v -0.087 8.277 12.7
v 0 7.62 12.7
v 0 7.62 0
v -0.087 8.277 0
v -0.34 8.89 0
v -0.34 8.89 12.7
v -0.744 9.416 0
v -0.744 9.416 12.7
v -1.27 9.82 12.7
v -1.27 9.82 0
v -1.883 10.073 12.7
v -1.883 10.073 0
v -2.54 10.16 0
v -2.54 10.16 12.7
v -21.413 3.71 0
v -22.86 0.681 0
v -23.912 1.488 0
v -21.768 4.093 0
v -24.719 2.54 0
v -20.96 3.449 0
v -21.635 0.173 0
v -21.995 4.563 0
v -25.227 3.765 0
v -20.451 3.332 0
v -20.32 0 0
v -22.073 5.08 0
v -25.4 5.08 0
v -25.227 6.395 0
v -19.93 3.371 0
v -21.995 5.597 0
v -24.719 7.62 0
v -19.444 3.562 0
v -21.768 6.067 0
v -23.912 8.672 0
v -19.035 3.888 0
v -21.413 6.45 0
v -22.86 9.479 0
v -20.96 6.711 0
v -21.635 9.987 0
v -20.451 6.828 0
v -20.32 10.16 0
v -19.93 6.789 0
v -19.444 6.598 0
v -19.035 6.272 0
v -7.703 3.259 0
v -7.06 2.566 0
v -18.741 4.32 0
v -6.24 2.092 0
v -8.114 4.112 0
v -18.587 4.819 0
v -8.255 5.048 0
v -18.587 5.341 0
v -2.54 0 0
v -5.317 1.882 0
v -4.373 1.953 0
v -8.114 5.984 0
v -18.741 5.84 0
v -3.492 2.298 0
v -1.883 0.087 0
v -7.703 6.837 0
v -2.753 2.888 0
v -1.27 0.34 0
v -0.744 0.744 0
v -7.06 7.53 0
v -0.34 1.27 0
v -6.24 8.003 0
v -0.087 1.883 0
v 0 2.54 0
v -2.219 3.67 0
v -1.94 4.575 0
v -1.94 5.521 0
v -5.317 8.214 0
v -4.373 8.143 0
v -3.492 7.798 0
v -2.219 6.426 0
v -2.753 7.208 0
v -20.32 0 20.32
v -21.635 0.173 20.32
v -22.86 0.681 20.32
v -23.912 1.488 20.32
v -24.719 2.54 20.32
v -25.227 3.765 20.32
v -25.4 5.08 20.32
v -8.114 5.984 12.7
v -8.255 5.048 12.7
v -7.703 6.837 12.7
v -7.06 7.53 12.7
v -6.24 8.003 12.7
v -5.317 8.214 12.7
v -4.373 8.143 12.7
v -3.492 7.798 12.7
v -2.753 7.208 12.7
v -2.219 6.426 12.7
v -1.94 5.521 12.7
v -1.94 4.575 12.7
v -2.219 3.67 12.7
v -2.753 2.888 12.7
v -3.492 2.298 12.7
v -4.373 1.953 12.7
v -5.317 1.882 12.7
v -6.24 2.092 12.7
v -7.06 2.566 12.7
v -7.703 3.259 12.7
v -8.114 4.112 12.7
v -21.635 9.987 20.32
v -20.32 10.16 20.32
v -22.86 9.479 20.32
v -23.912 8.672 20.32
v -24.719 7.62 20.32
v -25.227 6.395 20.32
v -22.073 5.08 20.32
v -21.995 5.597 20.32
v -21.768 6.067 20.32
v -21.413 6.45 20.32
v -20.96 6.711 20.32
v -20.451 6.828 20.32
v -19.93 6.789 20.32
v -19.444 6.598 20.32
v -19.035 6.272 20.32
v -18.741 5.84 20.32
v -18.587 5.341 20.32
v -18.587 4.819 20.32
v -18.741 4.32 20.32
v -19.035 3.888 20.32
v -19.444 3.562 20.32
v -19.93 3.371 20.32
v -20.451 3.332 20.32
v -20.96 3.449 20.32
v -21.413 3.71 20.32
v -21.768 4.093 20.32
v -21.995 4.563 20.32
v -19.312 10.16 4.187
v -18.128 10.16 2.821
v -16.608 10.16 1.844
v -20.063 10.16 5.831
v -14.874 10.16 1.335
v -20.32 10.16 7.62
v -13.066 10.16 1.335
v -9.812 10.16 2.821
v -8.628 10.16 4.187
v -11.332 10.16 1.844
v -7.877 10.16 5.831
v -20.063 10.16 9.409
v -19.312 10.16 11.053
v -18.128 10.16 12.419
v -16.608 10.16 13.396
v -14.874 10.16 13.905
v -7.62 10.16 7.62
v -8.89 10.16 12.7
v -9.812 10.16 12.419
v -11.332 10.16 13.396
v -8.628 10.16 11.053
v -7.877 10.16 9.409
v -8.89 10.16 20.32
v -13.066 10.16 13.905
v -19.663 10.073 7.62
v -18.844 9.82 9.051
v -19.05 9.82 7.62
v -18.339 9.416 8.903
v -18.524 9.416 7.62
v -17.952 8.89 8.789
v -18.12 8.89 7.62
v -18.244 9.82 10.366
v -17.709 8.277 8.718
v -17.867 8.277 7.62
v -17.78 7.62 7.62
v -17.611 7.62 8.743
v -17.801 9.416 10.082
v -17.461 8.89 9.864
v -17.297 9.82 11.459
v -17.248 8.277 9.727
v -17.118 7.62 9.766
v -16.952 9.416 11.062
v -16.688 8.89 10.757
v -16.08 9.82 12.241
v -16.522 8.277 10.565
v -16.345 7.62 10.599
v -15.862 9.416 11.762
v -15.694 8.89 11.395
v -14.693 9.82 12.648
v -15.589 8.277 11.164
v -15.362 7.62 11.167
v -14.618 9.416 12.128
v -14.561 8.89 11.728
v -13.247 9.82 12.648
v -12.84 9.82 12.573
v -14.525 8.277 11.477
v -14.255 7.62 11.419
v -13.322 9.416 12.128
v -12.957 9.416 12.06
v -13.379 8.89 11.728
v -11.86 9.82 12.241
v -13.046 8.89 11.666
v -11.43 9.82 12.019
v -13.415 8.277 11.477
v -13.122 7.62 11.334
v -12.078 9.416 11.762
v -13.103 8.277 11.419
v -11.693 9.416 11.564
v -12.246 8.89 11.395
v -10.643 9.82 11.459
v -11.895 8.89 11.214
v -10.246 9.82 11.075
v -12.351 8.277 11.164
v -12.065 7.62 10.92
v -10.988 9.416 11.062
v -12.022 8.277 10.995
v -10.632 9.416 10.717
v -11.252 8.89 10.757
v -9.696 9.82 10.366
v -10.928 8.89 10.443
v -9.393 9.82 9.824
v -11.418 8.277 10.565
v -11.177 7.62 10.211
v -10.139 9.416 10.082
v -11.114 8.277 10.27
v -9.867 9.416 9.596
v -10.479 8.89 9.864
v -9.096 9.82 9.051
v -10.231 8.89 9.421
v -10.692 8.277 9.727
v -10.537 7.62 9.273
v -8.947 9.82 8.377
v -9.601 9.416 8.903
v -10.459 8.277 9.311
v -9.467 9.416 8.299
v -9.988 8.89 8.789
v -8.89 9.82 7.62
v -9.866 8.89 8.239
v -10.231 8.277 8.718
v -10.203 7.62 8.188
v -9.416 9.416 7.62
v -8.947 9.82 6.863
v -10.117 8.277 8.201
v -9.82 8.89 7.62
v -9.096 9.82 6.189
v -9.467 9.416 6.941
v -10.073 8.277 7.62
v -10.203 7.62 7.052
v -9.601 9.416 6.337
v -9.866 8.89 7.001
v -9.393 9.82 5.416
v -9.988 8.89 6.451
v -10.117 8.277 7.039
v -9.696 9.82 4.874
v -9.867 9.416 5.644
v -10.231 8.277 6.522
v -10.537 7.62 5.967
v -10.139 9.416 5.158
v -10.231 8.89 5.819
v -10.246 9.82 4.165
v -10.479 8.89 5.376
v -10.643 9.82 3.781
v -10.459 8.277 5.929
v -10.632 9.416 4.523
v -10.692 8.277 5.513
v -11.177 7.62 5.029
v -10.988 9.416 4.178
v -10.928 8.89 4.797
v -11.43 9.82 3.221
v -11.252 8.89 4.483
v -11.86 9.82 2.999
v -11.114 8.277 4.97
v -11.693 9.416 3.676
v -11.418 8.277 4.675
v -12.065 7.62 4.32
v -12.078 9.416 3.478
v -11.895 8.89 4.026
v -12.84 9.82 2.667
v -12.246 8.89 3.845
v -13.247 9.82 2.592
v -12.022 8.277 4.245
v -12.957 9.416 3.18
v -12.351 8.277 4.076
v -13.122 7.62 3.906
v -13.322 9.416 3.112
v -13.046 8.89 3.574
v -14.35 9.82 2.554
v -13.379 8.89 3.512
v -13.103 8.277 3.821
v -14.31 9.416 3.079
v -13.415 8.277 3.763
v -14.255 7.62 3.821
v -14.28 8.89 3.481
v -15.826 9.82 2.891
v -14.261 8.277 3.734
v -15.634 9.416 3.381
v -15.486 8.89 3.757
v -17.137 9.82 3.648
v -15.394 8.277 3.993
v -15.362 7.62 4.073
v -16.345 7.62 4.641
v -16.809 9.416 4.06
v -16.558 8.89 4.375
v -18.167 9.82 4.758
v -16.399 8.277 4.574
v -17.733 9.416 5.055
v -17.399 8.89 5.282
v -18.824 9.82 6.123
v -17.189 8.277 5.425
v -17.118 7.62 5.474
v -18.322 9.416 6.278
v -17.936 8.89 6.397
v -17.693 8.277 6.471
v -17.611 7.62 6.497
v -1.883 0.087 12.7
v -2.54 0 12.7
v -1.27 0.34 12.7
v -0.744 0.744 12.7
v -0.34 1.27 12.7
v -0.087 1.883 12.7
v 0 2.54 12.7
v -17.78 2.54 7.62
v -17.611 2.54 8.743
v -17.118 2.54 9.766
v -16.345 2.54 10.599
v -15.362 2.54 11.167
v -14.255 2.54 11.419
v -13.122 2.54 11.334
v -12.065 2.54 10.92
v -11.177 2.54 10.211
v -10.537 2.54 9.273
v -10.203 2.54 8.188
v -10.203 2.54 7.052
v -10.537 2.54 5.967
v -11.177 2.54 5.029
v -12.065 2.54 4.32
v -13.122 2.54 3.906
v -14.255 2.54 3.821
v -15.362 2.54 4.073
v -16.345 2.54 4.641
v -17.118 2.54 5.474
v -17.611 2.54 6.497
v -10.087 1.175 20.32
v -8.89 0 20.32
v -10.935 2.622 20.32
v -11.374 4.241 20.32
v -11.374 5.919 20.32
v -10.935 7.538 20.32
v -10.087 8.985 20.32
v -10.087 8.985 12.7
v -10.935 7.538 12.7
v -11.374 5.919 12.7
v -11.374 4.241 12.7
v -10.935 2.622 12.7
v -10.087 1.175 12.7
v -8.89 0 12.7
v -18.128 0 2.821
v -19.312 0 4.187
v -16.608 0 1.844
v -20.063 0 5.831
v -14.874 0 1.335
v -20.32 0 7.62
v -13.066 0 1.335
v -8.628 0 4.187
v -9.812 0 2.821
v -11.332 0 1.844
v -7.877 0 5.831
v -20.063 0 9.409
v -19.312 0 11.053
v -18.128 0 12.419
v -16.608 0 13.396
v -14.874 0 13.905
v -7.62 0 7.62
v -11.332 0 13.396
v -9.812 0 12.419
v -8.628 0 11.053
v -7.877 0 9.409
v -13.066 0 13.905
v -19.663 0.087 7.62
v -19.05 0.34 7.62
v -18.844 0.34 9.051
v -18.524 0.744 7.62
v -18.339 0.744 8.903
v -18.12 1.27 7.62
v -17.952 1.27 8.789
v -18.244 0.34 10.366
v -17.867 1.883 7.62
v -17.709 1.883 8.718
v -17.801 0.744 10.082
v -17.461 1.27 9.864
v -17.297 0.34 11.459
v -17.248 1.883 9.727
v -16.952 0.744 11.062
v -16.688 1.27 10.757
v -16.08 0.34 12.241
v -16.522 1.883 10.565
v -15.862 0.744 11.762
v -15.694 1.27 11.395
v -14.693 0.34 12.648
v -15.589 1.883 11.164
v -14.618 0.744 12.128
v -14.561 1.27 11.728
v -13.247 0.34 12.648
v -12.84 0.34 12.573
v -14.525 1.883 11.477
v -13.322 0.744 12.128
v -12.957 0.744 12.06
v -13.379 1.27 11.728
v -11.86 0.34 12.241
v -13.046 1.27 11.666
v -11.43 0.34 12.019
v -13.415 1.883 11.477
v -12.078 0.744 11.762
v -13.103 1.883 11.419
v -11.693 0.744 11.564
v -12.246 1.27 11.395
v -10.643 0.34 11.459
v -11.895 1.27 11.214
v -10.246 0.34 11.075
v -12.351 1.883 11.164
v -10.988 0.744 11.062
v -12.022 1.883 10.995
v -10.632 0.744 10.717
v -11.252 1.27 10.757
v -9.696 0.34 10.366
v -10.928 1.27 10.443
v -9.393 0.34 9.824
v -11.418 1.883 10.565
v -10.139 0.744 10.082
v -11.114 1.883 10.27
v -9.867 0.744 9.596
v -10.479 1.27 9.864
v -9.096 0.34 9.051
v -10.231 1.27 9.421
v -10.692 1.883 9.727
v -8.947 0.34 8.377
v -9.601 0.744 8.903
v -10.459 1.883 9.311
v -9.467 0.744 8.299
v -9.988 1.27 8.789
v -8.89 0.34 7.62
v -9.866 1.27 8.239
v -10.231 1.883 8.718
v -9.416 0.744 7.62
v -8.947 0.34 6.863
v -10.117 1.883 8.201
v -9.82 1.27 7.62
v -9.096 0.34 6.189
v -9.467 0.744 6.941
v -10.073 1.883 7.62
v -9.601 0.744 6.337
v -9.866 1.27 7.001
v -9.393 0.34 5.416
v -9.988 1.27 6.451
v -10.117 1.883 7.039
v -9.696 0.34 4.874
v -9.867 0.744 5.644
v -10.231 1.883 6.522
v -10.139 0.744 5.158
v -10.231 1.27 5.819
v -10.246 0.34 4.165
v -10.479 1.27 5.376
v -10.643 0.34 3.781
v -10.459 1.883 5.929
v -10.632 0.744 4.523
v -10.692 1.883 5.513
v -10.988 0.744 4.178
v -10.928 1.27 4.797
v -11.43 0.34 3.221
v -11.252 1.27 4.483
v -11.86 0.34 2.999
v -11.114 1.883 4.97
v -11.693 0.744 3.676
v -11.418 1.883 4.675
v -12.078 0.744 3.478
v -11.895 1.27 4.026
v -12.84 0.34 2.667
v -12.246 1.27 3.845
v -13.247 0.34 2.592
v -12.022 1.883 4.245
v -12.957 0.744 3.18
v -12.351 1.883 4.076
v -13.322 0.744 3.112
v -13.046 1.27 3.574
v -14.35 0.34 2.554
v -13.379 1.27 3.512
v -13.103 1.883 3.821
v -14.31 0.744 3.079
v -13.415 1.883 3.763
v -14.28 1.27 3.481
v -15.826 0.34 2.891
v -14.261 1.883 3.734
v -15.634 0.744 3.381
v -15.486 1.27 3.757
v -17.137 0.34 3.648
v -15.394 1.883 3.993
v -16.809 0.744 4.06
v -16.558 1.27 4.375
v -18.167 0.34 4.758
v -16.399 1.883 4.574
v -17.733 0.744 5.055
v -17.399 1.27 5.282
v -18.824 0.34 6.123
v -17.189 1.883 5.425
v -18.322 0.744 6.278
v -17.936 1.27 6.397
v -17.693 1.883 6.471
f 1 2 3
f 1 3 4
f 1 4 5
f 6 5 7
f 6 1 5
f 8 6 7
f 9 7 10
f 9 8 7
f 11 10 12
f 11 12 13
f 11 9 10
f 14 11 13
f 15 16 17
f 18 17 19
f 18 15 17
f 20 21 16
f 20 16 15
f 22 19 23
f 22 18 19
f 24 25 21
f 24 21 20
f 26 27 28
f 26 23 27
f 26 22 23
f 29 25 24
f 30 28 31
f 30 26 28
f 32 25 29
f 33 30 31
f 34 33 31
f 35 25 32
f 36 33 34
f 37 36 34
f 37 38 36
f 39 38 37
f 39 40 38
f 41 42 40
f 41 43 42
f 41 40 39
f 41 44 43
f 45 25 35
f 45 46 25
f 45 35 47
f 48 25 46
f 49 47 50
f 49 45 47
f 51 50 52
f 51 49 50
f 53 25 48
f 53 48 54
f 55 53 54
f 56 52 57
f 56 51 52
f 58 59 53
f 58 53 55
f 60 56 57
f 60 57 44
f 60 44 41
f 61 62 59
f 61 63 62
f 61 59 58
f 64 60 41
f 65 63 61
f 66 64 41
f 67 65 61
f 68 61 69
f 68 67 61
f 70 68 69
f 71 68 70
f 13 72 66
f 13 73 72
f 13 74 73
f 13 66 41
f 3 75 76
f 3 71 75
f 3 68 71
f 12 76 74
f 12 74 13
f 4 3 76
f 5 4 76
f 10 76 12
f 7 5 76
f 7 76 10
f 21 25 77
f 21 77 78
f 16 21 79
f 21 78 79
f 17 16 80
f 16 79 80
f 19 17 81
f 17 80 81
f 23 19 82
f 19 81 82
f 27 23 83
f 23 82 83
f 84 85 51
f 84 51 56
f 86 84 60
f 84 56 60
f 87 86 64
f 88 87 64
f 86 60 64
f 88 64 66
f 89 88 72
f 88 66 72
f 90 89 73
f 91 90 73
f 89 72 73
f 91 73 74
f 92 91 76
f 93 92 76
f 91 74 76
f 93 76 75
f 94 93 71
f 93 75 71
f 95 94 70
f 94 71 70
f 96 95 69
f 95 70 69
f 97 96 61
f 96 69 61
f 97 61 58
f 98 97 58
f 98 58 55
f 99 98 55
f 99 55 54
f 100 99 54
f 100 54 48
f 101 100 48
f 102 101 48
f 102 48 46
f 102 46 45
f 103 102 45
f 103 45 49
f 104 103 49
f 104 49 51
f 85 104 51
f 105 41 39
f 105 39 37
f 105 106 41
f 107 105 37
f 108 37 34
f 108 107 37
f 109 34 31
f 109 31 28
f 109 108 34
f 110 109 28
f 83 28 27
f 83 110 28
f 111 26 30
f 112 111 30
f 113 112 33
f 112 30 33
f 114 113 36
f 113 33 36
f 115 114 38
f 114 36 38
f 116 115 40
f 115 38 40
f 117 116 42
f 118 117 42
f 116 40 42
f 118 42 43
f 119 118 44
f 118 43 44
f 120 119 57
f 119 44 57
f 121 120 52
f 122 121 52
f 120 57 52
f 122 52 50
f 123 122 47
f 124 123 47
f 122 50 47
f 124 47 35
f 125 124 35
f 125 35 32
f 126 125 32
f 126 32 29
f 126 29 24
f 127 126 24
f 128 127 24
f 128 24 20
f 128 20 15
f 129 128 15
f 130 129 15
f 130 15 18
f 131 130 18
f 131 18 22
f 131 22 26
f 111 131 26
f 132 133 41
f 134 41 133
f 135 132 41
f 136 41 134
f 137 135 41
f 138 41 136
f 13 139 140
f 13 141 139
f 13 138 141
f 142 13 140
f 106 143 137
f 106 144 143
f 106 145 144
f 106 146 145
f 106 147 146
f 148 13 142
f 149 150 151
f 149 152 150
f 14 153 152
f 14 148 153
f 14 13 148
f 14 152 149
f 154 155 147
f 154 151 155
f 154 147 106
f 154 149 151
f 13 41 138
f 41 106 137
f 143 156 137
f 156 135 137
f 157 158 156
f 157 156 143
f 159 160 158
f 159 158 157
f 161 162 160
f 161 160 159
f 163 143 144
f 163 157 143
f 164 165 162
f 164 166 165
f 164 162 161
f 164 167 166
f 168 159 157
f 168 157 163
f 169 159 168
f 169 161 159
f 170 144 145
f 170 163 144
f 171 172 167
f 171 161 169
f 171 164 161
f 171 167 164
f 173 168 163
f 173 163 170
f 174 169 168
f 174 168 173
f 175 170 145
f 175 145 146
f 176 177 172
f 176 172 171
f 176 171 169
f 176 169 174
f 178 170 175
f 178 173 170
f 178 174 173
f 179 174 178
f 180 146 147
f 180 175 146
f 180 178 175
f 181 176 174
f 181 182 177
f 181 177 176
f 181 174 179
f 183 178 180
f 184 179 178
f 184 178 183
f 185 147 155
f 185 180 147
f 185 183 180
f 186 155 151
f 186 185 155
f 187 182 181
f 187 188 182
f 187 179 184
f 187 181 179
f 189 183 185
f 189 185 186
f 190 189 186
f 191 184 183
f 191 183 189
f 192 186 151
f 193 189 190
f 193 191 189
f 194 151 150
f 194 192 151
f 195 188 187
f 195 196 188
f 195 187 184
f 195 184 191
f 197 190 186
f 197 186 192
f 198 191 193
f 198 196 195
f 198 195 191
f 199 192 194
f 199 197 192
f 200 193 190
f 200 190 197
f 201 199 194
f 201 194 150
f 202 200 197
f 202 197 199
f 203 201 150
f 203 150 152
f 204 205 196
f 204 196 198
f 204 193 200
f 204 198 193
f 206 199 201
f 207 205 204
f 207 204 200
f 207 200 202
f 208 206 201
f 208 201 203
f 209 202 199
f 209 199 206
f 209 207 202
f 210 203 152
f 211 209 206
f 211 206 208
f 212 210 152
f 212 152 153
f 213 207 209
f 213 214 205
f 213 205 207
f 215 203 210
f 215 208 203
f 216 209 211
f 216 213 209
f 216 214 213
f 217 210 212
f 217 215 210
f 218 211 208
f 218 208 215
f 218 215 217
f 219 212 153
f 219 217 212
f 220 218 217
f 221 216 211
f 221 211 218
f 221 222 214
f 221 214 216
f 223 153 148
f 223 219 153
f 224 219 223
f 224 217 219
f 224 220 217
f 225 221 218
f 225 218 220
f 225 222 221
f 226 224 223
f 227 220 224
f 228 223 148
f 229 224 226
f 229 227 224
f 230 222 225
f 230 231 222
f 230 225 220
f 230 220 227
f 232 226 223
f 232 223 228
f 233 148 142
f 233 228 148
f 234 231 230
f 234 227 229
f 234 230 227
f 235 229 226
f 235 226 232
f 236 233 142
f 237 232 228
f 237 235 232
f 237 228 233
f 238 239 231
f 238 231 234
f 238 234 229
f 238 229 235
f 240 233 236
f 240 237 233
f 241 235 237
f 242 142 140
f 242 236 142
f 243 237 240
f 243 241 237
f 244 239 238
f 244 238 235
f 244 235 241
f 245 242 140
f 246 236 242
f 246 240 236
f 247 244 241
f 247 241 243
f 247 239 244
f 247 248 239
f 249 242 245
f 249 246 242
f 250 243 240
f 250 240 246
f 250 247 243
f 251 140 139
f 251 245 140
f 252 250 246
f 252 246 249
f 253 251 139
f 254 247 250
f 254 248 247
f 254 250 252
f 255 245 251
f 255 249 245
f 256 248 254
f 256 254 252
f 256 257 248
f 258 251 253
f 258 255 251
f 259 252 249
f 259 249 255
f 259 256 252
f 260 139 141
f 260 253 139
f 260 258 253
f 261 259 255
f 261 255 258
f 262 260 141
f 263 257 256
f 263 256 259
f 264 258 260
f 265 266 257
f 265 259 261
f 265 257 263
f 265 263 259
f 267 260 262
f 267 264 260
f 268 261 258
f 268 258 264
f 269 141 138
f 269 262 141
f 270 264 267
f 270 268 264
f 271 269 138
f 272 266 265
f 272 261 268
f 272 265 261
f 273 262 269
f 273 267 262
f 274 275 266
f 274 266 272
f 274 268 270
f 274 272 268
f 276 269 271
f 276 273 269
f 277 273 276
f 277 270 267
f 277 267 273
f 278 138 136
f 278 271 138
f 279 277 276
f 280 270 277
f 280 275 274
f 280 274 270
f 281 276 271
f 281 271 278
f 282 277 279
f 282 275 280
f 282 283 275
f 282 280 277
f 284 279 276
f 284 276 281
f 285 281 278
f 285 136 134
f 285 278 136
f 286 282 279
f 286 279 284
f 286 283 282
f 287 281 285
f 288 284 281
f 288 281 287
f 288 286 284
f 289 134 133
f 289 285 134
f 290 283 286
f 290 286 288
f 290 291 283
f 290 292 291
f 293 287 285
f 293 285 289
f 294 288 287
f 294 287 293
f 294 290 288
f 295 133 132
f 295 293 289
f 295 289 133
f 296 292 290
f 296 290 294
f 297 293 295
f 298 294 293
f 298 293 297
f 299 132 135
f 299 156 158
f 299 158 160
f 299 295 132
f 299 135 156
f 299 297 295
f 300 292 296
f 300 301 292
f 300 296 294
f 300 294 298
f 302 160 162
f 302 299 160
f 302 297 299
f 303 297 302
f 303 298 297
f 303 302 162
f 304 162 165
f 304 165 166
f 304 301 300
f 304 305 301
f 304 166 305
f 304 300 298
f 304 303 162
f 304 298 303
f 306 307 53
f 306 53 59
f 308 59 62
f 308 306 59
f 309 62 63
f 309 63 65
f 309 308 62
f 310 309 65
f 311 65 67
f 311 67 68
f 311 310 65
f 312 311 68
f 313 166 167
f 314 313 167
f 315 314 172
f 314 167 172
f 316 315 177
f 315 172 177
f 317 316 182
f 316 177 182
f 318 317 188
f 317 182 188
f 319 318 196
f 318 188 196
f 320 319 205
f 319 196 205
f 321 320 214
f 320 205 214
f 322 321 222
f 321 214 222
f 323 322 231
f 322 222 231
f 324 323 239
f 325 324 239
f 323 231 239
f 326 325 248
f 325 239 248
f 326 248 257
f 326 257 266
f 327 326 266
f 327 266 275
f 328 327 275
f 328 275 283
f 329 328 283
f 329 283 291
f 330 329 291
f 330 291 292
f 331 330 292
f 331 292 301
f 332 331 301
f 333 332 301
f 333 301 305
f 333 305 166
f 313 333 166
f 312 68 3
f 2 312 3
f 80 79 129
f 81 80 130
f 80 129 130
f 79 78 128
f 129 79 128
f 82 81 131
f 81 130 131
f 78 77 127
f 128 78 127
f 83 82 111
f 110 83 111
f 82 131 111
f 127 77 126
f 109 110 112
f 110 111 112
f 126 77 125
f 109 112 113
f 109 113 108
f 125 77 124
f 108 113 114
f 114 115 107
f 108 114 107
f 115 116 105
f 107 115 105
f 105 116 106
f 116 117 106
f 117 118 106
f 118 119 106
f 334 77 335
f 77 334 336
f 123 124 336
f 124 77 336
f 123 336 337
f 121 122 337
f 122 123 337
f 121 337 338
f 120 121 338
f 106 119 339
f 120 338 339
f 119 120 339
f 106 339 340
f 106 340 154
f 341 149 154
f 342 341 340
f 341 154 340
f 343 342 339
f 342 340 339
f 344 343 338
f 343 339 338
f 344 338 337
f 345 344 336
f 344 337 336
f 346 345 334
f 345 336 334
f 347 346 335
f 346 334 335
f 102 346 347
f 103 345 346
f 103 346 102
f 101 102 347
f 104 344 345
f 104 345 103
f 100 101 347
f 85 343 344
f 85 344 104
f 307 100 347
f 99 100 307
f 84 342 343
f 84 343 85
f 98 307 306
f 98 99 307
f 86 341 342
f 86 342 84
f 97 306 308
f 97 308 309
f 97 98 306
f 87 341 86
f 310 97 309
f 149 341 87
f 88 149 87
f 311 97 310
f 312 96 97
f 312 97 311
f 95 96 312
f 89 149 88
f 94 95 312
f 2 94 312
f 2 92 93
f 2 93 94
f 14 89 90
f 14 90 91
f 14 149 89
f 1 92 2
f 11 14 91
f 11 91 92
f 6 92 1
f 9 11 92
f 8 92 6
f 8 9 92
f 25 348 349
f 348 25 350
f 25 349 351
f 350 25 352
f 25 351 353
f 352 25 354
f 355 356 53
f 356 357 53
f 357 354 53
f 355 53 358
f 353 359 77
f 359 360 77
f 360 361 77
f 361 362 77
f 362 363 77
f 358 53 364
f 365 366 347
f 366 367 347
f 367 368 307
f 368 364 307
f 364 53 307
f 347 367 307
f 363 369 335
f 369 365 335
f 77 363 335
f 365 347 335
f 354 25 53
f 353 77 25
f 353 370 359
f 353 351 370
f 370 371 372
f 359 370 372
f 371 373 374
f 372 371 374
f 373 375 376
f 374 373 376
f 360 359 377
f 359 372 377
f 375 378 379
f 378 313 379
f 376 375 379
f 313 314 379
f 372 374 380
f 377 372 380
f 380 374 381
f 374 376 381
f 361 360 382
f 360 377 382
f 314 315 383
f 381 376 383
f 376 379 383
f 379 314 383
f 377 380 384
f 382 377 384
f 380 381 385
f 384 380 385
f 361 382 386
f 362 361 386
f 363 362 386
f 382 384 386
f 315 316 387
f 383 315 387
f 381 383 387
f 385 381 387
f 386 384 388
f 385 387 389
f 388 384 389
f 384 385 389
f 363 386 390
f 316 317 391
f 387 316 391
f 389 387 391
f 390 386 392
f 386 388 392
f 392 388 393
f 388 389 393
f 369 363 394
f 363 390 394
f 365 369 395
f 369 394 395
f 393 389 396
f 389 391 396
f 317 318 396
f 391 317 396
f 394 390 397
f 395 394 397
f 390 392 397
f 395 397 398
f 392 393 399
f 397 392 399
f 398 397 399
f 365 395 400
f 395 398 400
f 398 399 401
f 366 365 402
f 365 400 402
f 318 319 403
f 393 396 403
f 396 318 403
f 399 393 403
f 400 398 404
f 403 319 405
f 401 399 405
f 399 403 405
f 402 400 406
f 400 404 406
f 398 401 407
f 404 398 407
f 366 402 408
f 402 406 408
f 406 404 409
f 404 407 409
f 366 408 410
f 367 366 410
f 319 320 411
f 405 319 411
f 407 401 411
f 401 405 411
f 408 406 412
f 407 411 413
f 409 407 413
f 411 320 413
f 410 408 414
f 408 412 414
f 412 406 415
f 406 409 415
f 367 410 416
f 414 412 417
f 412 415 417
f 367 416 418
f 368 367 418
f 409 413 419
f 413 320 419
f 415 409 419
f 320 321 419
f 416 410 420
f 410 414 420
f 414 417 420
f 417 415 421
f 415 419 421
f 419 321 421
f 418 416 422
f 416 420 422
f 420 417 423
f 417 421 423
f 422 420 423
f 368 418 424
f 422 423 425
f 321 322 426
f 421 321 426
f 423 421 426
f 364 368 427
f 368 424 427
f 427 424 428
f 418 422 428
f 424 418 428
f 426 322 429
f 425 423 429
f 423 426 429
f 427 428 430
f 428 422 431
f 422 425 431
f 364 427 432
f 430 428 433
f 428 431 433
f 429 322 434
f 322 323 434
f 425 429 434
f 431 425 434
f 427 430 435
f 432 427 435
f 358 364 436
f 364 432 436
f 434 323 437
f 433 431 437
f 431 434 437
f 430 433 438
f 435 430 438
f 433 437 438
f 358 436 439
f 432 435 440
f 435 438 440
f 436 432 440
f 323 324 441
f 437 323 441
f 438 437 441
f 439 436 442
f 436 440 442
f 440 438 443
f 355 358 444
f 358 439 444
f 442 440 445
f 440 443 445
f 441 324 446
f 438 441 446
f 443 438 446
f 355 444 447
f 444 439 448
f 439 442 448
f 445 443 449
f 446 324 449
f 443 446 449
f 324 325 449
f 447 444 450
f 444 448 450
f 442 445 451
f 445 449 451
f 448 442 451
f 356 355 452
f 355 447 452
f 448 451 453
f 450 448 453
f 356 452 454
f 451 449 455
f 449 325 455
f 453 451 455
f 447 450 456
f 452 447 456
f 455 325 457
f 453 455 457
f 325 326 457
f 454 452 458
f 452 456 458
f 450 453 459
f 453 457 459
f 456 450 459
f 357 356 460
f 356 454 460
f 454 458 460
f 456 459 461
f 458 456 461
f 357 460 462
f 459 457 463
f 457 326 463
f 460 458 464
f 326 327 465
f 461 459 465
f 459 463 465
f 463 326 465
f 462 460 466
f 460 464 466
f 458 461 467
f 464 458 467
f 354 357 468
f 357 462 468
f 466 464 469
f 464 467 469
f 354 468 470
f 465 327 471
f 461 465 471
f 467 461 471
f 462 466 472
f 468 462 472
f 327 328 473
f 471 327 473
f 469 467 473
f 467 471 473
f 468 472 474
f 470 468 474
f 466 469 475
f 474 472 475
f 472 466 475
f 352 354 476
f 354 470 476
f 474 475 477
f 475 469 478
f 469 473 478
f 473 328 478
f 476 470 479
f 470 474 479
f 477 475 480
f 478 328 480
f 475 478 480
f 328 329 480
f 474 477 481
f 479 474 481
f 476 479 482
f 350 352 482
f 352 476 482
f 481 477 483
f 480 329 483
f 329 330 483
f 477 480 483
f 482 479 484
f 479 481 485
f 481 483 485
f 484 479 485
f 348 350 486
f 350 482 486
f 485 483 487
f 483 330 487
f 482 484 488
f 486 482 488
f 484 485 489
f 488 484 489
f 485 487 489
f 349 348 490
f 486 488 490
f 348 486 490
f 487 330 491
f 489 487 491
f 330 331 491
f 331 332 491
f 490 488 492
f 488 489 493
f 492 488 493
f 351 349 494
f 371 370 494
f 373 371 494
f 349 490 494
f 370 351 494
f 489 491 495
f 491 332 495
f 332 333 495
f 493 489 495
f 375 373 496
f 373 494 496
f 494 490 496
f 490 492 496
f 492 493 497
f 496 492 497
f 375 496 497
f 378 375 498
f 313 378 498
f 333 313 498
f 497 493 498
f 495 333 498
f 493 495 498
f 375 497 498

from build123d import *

# Parameters (mm, degrees)
SKETCH2_W                   = 10.16
SKETCH2_H                   = 10.16
EXTRUDE2_DEPTH              = 20.32
FILLET1_R                   = 2.54
SKETCH5_W                   = 20.32
SKETCH5_H                   = 10.16
EXTRUDE3_DEPTH              = 15.24
FILLET3_R                   = 5.08
SKETCH9_R                   = 3.81
CUT_EXTRUDE1_DEPTH          = 35.077675977
FILLET4_R                   = 2.54
SKETCH10_R                  = 6.35
CUT_EXTRUDE2_DEPTH          = 7.62
F_1_4_0_25_DIAMETER_HOLE1_D = 6.35
F_6_32_TAPPED_HOLE1_D       = 3.5052


with BuildPart() as part:
    # Sketch2 → Extrude2 (new body)
    with BuildSketch(Plane.XY):
        with Locations((-5.08, 5.08)):
            Rectangle(SKETCH2_W, SKETCH2_H)
    extrude(amount=EXTRUDE2_DEPTH)

    # Fillet1
    fillet1_edges = [part.edges().sort_by_distance(p)[0] for p in [
        (0, 0, 10.16),
        (0, 10.16, 10.16),
    ]]
    fillet(fillet1_edges, radius=FILLET1_R)

    # Sketch5 → Extrude3 (add)
    with BuildSketch(Plane.ZY.offset(10.16)):
        with Locations((10.16, 5.08)):
            Rectangle(SKETCH5_W, SKETCH5_H)
    extrude(amount=EXTRUDE3_DEPTH)

    # Fillet3
    fillet3_edges = [part.edges().sort_by_distance(p)[0] for p in [
        (-25.4, 0, 10.16),
        (-25.4, 10.16, 10.16),
    ]]
    fillet(fillet3_edges, radius=FILLET3_R - 0.0001)  # a hair under: the kernel refuses the full size

    # Sketch9 → Cut-Extrude1 (cut, through all)
    with BuildSketch(Plane(origin=(0, 10.16, 0), x_dir=(-1, 0, 0), z_dir=(0, 1, 0))):
        with Locations((13.97, 7.62)):
            Circle(SKETCH9_R)
    extrude(amount=-CUT_EXTRUDE1_DEPTH, mode=Mode.SUBTRACT)

    # Fillet4
    fillet4_edges = [part.edges().sort_by_distance(p)[0] for p in [
        (-10.16, 0, 7.62),
        (-10.16, 10.16, 7.62),
    ]]
    fillet(fillet4_edges, radius=FILLET4_R)

    # Sketch10 → Cut-Extrude2 (cut)
    with BuildSketch(Plane.XY.offset(20.32)):
        with Locations((-5.08, 5.08)):
            Circle(SKETCH10_R)
    extrude(amount=-CUT_EXTRUDE2_DEPTH, mode=Mode.SUBTRACT)

    # 1/4 (0.25) Diameter Hole1 (through all)
    with Locations(Plane(origin=(-5.08, 5.047963929, 12.7), x_dir=(1, 0, 0), z_dir=(0, 0, 1))):
        with Locations((0, 0)):
            Hole(F_1_4_0_25_DIAMETER_HOLE1_D / 2)

    # #6-32 Tapped Hole1 (through all)
    with Locations(Plane(origin=(-20.32, 5.08, 20.32), x_dir=(1, 0, 0), z_dir=(0, 0, 1))):
        with Locations((0, 0)):
            Hole(F_6_32_TAPPED_HOLE1_D / 2)


solid = part.part
